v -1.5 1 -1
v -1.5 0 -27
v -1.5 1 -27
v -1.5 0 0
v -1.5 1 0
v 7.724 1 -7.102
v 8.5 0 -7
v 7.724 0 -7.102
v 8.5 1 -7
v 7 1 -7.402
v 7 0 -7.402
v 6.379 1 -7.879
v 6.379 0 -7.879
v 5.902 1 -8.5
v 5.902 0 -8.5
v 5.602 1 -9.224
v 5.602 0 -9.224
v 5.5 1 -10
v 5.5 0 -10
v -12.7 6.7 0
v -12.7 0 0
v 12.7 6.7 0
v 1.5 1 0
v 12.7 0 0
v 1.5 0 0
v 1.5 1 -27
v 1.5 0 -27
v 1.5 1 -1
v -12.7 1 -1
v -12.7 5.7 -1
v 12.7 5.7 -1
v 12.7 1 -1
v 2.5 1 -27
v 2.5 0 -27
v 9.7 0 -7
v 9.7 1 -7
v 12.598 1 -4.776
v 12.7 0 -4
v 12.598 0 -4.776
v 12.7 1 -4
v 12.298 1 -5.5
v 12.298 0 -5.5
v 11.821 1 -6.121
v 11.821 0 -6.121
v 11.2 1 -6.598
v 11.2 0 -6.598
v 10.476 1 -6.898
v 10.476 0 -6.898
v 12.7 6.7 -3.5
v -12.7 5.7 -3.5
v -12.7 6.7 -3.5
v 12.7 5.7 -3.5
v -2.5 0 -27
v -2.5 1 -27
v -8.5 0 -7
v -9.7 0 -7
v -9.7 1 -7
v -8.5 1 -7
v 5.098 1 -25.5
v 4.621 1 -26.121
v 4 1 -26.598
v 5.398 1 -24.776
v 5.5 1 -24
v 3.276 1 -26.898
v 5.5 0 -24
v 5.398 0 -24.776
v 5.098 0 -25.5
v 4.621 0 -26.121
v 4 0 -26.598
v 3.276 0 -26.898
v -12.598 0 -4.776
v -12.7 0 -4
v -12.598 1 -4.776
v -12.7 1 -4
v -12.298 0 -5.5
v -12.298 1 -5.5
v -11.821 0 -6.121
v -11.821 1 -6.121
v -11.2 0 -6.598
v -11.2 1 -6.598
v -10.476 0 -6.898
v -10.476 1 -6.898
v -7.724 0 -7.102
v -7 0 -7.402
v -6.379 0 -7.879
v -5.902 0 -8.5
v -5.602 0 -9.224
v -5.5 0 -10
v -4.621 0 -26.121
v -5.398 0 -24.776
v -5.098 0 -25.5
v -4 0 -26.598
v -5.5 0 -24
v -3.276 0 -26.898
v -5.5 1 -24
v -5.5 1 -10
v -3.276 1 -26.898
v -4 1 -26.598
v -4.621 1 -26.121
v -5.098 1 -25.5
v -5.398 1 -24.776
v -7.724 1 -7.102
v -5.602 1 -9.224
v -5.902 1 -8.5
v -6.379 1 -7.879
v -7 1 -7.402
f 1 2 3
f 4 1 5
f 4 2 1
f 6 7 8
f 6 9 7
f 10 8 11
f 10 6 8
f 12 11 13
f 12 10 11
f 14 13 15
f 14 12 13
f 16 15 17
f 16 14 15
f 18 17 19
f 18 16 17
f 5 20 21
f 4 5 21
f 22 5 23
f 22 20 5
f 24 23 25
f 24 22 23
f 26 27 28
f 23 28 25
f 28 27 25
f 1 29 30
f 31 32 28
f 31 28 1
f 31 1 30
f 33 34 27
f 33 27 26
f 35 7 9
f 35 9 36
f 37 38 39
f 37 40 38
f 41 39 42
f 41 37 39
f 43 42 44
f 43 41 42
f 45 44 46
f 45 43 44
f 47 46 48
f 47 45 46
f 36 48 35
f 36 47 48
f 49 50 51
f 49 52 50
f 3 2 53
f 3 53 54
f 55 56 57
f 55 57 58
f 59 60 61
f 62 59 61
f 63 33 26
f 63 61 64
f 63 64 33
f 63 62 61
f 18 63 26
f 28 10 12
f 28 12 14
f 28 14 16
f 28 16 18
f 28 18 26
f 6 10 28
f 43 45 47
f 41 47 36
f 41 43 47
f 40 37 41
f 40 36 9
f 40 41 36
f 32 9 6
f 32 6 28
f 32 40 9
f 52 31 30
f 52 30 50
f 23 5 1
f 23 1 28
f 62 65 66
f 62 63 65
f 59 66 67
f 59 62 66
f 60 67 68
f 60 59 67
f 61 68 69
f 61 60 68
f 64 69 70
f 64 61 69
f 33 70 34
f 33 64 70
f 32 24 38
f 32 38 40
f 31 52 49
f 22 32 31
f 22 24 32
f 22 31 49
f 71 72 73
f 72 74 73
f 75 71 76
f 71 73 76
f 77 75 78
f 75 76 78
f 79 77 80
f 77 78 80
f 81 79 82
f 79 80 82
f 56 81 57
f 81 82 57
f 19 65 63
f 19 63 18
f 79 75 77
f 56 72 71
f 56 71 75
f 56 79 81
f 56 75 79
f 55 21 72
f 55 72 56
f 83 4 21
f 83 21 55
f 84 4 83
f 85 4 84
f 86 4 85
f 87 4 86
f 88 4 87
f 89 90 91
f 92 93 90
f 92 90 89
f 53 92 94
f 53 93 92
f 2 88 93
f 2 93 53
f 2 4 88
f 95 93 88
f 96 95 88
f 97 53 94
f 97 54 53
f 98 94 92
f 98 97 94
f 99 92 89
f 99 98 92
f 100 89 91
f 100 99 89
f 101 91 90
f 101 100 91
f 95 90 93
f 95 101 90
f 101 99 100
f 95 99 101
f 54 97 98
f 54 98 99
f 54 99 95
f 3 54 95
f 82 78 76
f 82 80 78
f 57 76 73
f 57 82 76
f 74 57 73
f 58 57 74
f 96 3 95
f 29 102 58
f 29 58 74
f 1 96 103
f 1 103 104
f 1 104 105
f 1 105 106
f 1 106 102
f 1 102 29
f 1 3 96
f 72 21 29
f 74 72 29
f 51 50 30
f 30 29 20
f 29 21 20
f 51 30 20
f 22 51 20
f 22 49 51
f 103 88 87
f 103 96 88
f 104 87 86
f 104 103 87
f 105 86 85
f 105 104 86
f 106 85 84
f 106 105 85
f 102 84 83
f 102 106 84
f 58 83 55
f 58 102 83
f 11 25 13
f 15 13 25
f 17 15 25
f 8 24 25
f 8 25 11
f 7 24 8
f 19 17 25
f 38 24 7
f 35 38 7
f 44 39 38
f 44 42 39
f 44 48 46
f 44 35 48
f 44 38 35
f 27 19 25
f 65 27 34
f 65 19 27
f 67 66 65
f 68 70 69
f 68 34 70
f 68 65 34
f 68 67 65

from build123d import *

# Parameters (mm, degrees)
F1_DEPTH = 12.7
F2_W     = 3
F2_H     = 27
F2_W_2   = 7.2
F2_H_2   = 20
F3_DEPTH = 1
F4_R     = 3


with BuildPart() as f1:
    # F0 (on Right) → F1 (new body, symmetric)
    with BuildSketch(Plane.YZ):
        Polygon((6.7, 0), (0, 0), (0, -27), (1, -27), (1, -1), (5.7, -1), (5.7, -3.5), (6.7, -3.5), align=None)
    extrude(amount=F1_DEPTH, both=True)

    # F2 (on face) → F3 (cut, through all)
    with BuildSketch(Plane.XZ):
        with Locations((0, -13.5)):
            Rectangle(F2_W, F2_H)
        with Locations((-9.1, -17)):
            Rectangle(F2_W_2, F2_H_2)
        with Locations((9.1, -17)):
            Rectangle(F2_W_2, F2_H_2)
    extrude(amount=-F3_DEPTH, mode=Mode.SUBTRACT)

    # F4
    f4_edges = [f1.edges().sort_by_distance(p)[0] for p in [
        (5.5, 0.5, -27),
        (-5.5, 0.5, -27),
        (-5.5, 0.5, -7),
        (-12.7, 0.5, -7),
        (5.5, 0.5, -7),
        (12.7, 0.5, -7),
    ]]
    fillet(f4_edges, radius=F4_R)


solid = f1.part
